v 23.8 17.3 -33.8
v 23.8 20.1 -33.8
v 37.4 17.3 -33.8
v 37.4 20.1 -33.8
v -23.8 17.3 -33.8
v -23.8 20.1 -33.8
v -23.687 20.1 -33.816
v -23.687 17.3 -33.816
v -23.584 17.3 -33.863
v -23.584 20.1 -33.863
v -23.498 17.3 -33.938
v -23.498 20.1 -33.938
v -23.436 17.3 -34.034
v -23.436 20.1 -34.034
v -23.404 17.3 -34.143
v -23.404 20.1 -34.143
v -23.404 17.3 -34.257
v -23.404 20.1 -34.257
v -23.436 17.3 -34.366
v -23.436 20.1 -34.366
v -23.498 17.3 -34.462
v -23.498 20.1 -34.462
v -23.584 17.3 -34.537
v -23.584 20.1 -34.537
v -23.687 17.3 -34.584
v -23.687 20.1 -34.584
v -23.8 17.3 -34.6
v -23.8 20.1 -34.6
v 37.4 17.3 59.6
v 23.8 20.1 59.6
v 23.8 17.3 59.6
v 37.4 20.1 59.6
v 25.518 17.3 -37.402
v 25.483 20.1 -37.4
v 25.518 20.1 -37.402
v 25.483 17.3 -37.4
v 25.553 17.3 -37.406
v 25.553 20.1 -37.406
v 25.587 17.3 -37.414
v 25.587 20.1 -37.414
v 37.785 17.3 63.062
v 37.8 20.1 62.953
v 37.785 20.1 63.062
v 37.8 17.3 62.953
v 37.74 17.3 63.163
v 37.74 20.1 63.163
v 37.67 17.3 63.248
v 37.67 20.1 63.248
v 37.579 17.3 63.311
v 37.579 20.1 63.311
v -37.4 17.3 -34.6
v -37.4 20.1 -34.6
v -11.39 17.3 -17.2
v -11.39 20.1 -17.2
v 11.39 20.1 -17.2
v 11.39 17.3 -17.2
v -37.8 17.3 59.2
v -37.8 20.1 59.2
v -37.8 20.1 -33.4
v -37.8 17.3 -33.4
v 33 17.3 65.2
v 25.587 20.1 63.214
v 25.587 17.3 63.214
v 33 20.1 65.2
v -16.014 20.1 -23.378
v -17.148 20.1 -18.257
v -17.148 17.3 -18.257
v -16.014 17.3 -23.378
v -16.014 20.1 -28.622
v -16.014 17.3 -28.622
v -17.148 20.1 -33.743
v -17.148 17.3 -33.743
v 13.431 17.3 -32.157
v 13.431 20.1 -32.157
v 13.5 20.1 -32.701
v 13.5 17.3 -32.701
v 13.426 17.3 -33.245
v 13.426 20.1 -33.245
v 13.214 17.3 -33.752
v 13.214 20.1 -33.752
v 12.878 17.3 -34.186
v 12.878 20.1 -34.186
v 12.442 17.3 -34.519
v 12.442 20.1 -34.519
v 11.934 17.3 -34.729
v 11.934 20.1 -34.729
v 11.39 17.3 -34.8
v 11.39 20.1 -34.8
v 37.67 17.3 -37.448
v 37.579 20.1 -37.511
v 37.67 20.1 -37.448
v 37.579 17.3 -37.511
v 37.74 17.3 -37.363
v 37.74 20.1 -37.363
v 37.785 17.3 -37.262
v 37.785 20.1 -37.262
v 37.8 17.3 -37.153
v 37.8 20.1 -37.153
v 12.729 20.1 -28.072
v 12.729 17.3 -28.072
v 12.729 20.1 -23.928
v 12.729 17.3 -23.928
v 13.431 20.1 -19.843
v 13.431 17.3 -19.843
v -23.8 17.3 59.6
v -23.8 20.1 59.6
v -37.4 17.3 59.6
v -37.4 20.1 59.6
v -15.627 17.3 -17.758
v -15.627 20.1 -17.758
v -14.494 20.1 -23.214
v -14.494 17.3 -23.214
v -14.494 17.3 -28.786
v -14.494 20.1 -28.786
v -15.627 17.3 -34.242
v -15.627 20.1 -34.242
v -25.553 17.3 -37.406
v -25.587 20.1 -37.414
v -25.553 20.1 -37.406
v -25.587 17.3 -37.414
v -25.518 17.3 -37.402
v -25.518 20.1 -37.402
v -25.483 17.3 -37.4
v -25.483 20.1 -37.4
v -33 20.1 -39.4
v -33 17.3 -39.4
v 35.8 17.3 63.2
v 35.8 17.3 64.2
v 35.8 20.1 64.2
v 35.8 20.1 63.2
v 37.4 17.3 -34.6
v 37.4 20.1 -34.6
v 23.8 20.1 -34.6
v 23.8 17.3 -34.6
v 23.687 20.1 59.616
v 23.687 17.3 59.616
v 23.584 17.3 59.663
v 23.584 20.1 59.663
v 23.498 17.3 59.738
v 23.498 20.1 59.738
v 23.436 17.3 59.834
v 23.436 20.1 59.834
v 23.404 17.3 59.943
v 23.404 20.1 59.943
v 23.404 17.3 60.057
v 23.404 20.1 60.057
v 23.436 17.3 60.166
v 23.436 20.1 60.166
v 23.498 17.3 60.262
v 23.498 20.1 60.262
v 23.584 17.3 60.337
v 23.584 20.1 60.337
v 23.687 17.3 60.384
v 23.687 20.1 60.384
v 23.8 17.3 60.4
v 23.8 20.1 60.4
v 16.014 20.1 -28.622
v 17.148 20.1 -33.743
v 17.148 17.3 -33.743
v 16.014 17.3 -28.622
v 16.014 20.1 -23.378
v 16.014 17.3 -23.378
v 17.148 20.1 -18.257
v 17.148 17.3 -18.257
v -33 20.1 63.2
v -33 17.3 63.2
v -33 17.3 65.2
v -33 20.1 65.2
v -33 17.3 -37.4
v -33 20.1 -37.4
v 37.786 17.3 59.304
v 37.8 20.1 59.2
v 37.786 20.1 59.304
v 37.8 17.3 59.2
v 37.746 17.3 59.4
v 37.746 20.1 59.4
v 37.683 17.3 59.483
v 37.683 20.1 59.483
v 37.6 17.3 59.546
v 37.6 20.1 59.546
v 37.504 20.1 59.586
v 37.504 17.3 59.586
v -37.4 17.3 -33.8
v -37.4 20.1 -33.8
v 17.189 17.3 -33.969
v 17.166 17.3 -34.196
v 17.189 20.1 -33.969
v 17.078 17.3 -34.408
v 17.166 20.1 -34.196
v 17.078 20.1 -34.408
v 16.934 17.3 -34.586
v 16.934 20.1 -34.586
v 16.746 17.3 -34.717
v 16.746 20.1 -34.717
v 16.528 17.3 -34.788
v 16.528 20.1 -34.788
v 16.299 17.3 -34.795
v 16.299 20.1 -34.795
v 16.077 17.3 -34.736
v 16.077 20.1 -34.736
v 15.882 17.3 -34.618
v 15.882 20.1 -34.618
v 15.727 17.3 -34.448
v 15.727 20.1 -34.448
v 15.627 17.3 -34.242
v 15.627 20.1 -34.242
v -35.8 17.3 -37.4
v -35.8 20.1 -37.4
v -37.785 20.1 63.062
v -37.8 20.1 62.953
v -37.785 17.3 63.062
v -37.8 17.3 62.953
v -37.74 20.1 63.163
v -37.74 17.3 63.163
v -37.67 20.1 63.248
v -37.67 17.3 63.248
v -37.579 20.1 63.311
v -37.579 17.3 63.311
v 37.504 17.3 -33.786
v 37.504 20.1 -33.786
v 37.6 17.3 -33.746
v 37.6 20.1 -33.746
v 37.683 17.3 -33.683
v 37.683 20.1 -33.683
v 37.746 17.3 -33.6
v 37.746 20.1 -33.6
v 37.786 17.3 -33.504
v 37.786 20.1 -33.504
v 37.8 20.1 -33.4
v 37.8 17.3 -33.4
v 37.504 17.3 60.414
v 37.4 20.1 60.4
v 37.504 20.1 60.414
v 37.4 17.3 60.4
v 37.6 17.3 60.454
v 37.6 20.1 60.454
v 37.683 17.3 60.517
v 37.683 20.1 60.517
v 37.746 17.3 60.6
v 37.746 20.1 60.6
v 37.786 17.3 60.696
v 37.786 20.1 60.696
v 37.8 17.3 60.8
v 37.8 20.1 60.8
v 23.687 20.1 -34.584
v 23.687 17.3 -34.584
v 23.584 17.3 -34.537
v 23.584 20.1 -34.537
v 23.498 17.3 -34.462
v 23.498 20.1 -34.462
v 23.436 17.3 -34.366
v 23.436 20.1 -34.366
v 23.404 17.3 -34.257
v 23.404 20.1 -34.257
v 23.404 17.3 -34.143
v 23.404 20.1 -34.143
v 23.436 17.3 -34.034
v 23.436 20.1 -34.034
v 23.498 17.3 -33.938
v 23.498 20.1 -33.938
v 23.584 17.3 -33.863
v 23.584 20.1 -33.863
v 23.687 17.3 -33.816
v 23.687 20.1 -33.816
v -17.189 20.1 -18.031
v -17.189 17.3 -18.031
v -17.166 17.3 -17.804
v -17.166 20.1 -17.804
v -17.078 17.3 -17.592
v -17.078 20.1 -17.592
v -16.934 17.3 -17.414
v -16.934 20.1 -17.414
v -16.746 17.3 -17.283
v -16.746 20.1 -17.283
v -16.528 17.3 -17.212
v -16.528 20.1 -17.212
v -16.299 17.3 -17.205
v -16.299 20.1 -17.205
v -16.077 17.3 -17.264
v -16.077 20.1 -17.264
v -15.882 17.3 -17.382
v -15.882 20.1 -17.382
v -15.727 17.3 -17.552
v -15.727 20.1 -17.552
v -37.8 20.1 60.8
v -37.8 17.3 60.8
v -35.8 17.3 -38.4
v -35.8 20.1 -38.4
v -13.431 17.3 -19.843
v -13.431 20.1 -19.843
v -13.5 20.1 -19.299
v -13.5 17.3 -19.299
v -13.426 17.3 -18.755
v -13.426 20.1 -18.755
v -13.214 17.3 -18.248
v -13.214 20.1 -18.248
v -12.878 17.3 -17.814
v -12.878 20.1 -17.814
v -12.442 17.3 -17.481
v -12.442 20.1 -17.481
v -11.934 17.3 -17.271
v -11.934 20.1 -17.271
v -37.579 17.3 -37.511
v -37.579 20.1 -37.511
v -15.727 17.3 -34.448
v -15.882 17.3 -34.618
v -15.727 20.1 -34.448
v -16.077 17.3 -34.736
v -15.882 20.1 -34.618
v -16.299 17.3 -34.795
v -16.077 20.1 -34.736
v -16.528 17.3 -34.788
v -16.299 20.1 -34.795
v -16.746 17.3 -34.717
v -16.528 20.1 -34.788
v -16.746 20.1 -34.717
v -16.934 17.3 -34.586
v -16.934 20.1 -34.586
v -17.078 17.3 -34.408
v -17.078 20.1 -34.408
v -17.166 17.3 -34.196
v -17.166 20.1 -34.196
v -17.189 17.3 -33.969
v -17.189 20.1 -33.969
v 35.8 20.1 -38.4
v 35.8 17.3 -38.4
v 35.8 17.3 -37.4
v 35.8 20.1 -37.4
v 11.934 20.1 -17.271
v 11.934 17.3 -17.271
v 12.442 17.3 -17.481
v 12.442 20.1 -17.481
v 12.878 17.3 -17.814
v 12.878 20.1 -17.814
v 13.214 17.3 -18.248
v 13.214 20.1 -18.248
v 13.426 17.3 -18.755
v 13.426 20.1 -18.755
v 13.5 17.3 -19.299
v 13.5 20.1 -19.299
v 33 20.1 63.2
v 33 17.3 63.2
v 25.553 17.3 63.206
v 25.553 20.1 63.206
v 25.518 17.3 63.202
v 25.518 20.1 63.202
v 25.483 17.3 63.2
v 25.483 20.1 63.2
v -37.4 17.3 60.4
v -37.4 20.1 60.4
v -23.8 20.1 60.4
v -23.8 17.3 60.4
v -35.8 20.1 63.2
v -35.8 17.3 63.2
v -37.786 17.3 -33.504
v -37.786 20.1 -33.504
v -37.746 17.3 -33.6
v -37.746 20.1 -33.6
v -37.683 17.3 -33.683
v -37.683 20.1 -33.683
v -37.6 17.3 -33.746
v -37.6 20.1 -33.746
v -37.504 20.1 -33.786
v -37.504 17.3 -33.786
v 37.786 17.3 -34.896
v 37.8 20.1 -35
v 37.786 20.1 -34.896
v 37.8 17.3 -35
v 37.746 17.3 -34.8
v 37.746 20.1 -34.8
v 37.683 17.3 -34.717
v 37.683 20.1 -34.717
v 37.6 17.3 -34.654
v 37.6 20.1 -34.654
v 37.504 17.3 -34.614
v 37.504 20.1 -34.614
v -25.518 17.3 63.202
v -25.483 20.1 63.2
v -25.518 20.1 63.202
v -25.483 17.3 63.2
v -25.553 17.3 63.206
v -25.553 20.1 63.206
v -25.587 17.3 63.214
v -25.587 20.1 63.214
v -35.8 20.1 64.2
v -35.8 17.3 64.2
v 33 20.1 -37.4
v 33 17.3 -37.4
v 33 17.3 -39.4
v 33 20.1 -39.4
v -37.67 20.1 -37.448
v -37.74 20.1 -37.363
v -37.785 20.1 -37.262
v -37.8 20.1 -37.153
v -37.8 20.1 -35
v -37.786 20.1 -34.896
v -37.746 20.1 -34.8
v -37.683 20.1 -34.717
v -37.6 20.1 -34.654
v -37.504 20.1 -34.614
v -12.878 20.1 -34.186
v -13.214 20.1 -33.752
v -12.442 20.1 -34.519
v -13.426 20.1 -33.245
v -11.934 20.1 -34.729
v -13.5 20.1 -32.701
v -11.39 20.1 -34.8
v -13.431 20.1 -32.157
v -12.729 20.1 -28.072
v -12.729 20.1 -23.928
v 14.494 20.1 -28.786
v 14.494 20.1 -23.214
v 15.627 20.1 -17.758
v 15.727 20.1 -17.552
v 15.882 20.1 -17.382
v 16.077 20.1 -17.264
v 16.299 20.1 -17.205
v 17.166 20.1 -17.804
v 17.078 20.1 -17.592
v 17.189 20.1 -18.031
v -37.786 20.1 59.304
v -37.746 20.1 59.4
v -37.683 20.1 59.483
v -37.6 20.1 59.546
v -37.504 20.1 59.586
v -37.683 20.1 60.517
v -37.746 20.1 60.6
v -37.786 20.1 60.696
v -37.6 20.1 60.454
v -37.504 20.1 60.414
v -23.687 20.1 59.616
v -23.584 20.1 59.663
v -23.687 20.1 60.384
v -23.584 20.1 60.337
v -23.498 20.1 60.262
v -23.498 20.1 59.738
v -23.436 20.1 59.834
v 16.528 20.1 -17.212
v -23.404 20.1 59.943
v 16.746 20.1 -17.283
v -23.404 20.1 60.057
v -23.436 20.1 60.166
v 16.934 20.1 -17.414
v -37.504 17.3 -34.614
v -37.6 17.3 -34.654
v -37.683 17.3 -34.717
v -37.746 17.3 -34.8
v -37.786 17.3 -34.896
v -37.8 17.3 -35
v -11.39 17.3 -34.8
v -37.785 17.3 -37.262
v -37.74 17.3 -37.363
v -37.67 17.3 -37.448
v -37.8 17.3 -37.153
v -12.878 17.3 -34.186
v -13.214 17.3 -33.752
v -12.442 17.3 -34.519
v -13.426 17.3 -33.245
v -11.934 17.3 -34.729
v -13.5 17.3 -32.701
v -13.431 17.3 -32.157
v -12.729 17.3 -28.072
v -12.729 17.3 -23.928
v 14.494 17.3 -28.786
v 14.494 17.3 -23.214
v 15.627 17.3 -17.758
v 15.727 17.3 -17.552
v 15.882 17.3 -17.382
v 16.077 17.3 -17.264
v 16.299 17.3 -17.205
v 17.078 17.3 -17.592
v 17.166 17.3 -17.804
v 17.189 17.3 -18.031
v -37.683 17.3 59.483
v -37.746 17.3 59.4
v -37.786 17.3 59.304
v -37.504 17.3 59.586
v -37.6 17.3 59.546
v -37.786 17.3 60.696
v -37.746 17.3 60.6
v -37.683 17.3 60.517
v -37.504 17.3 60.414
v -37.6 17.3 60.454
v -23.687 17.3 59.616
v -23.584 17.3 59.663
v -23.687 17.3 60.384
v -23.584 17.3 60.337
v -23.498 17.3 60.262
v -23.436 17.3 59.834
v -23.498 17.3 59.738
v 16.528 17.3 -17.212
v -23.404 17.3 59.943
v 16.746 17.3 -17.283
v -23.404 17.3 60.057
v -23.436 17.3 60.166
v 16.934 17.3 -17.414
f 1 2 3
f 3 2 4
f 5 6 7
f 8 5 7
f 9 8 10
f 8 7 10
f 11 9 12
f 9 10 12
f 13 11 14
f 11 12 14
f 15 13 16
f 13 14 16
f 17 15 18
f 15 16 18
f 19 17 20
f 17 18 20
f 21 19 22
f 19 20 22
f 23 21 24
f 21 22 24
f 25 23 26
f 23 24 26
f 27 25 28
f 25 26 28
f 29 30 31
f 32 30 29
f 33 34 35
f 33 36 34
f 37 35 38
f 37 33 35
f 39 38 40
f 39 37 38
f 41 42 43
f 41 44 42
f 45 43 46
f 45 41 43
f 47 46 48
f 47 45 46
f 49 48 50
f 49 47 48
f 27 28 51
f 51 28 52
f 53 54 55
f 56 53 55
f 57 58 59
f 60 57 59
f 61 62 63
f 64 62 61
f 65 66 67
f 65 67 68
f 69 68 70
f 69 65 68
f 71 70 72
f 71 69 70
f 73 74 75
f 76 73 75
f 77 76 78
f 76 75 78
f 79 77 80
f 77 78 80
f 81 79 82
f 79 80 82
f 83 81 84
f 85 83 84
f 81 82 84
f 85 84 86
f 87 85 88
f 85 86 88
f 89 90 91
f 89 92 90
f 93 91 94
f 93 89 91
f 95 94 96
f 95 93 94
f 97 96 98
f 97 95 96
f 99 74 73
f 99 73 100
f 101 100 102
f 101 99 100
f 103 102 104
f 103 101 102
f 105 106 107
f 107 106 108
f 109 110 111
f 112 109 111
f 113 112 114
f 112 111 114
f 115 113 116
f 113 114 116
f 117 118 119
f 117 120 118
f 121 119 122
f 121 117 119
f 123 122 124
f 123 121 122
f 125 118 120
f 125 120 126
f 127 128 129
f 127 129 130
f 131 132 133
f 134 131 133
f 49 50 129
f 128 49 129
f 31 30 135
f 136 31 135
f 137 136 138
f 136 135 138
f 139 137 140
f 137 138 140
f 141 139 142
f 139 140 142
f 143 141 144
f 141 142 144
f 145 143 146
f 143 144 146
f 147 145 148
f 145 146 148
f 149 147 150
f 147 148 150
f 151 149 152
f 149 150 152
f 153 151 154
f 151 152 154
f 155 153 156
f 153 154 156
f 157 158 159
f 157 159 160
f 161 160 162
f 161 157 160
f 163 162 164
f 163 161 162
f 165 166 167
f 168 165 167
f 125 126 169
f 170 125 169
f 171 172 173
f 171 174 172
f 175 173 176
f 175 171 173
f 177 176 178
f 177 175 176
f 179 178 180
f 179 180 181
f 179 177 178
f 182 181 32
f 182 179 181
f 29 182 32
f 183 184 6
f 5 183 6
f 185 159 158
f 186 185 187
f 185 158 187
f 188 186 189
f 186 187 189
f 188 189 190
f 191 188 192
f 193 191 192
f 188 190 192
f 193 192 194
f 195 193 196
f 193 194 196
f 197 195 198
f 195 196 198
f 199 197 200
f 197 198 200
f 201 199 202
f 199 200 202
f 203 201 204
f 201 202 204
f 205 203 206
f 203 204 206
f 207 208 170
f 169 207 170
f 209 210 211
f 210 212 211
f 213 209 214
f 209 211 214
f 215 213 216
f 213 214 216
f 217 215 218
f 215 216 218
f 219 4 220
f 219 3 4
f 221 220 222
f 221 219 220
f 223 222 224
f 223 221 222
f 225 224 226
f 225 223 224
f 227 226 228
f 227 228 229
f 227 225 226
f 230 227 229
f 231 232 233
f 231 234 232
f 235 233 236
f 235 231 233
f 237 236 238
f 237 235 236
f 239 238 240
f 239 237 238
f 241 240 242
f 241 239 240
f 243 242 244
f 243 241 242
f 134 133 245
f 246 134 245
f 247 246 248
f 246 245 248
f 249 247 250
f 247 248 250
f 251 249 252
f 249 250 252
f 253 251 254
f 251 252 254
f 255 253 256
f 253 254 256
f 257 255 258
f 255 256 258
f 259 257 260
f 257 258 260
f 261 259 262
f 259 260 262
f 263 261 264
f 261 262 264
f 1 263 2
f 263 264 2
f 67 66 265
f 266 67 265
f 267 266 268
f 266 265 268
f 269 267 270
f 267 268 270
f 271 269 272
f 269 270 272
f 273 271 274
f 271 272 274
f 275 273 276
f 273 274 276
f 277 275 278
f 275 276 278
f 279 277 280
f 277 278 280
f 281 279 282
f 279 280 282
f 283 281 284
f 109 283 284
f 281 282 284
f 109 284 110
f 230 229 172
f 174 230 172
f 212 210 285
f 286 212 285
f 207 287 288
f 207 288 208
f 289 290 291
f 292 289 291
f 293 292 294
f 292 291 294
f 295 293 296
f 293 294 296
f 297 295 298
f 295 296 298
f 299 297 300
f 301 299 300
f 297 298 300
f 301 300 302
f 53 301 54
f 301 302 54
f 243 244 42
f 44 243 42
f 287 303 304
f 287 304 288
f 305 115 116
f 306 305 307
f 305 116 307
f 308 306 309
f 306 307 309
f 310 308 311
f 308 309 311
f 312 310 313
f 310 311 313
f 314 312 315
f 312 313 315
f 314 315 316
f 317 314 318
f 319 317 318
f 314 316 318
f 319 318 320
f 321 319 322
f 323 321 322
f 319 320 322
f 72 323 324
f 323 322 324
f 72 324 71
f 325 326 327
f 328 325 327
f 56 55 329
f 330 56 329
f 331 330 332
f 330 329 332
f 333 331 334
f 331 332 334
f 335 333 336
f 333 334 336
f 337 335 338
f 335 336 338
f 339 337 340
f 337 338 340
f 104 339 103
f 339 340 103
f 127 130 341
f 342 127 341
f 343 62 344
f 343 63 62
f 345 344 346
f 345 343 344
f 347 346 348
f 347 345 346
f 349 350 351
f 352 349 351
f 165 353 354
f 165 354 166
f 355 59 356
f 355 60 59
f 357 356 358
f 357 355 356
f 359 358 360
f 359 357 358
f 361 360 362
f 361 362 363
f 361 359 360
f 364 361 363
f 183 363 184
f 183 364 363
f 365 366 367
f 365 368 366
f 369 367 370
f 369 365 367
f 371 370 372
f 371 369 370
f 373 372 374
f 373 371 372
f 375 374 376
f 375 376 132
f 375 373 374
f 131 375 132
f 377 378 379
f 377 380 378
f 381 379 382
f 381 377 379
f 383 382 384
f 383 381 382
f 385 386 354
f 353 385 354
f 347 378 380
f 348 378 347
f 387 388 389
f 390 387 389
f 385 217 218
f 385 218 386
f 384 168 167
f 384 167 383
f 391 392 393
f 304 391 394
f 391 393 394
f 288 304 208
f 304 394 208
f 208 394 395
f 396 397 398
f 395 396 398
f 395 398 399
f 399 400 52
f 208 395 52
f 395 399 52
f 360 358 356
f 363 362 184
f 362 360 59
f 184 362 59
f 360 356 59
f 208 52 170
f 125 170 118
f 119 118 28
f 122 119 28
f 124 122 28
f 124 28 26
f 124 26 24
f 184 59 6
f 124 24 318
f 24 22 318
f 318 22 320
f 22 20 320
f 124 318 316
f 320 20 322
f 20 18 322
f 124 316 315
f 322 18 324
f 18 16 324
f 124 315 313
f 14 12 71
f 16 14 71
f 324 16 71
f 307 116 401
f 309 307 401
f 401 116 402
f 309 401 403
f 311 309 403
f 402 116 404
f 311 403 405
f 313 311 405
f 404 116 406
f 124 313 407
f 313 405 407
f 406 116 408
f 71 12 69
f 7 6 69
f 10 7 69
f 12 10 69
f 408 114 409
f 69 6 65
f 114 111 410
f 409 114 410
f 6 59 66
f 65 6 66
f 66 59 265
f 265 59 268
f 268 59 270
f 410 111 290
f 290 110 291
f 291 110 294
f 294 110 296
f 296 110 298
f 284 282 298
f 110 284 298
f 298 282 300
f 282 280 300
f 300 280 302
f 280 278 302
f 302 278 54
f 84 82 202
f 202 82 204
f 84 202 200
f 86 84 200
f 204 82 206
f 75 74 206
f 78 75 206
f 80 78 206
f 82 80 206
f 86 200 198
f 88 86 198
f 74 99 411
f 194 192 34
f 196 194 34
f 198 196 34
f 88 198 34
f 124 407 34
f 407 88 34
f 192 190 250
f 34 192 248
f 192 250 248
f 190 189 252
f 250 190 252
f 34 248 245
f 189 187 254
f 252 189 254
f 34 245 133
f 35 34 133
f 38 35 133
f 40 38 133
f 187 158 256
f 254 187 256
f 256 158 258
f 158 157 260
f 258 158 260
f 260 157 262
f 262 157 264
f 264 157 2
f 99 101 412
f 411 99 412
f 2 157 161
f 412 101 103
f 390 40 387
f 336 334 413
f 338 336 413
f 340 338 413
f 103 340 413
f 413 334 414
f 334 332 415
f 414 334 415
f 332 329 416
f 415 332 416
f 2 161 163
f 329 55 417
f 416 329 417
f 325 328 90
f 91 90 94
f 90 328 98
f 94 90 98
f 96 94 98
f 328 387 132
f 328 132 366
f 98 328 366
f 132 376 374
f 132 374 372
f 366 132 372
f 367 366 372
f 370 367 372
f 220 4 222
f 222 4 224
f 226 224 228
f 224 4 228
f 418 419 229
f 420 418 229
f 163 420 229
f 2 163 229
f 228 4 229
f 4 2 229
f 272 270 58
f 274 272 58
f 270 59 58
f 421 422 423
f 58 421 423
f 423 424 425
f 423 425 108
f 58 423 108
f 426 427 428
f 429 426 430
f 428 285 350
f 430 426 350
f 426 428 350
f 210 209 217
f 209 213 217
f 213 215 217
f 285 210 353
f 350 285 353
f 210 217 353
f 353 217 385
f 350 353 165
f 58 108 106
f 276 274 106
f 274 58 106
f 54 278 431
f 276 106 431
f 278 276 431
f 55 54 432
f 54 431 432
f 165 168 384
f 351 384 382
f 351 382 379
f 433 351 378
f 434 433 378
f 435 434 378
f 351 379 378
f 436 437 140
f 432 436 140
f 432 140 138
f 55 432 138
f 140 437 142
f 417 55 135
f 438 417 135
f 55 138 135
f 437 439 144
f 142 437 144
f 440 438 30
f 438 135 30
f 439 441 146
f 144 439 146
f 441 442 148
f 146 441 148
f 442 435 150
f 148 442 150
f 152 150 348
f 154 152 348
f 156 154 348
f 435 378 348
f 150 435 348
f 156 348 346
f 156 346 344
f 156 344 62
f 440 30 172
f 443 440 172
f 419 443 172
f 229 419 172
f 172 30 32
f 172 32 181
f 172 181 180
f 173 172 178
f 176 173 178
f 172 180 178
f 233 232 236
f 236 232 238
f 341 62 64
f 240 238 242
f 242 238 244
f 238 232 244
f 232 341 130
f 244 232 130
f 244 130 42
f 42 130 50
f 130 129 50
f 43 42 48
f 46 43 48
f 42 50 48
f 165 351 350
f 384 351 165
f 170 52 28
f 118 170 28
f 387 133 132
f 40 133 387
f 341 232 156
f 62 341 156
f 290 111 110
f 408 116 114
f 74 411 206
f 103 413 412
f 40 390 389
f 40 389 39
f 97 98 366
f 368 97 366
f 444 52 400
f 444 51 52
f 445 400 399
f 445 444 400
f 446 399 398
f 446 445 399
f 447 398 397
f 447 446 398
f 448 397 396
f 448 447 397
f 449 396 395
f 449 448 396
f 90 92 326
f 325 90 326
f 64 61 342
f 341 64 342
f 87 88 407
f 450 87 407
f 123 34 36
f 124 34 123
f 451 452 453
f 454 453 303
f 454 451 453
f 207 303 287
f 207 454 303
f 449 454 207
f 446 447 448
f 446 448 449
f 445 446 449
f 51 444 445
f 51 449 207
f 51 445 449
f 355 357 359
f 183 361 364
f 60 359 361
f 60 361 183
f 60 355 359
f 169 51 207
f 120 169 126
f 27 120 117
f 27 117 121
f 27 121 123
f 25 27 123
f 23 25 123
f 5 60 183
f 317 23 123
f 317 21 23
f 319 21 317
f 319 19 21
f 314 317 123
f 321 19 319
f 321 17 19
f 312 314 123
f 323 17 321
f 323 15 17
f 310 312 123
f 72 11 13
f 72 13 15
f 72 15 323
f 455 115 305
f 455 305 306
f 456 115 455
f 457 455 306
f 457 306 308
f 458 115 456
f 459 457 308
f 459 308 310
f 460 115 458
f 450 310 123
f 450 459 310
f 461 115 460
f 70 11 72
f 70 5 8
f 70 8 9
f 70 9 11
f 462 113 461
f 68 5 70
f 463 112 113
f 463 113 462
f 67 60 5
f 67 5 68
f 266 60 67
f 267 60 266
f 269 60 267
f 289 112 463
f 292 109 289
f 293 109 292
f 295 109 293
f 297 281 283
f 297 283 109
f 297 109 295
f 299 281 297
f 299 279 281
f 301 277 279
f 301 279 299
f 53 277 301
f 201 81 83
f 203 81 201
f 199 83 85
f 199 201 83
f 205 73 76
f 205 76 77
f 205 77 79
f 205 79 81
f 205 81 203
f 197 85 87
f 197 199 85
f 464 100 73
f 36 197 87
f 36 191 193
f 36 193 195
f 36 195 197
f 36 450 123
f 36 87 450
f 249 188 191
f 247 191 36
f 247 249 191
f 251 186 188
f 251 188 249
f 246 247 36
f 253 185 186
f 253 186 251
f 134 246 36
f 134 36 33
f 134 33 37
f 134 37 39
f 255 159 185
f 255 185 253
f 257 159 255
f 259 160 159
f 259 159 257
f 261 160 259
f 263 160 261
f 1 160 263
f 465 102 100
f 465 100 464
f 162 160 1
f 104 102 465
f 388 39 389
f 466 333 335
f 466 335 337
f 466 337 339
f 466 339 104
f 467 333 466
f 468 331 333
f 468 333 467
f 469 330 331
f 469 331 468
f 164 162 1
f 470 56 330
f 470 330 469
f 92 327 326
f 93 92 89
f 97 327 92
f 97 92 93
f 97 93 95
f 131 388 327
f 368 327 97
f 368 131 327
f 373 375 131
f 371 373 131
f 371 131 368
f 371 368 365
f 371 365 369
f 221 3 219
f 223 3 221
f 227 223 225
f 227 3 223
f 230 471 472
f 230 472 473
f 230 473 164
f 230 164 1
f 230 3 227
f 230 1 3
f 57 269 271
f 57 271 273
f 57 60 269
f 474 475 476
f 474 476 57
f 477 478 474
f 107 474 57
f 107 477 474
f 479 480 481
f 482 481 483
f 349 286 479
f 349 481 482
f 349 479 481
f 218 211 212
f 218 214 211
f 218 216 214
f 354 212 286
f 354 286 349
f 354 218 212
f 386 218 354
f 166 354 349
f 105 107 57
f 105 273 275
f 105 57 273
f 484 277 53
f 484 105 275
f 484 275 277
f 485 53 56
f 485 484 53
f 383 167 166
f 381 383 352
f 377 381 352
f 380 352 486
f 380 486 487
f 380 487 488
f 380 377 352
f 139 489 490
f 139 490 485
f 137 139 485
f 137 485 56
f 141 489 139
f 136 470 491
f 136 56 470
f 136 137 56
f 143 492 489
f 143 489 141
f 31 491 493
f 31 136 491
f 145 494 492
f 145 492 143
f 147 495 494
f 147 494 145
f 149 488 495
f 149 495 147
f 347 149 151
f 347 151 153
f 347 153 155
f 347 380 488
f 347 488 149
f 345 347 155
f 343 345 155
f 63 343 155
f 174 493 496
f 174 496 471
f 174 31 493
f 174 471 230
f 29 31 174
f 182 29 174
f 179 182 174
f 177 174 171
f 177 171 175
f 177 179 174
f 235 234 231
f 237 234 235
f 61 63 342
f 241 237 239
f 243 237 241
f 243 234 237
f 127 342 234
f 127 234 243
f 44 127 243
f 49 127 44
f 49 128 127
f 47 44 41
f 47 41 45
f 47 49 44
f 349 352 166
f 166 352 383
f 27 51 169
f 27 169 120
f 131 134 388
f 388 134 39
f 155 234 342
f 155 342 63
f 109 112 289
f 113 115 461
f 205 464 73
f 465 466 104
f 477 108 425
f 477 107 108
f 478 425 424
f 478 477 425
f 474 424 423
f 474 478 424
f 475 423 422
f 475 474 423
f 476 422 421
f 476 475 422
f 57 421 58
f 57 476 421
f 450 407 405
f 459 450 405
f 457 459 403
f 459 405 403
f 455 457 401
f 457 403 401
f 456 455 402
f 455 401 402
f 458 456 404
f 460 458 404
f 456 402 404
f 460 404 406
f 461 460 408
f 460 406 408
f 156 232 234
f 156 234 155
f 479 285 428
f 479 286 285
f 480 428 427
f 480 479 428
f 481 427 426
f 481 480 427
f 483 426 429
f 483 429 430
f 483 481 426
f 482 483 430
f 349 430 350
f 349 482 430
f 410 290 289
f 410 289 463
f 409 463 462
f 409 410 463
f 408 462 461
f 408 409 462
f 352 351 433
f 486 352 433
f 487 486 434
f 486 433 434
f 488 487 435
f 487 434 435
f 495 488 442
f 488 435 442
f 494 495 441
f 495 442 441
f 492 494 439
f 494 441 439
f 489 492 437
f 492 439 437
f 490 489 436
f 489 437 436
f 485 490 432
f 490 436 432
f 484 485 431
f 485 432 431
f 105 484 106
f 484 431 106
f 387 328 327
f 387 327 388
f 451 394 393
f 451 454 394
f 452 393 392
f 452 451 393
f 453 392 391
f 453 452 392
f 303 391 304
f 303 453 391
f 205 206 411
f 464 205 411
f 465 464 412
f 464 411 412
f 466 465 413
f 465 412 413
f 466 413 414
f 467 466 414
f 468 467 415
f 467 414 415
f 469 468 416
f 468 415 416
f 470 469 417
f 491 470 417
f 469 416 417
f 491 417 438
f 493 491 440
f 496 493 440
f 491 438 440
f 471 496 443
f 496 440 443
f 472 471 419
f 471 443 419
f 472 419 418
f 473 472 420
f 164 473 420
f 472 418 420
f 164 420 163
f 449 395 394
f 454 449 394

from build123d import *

# Parameters (mm, degrees)
PAD008_DEPTH = 2.8
FILLET001_R  = 0.4
POCKET_DEPTH = 2.801


with BuildPart() as part:
    # Sketch008 → Pad008 (new body)
    with BuildSketch(Plane(origin=(0, 20.1, 0), x_dir=(-1, 0, 0), z_dir=(0, 1, 0))):
        with BuildLine():
            Line((37.8, 63.2), (37.8, 60.4))
            Line((37.8, 60.4), (23.8, 60.4))
            ThreePointArc((23.8, 60.4), (23.4, 60), (23.8, 59.6))
            Line((23.8, 59.6), (37.8, 59.6))
            Line((37.8, 59.6), (37.8, -33.8))
            Line((37.8, -33.8), (23.8, -33.8))
            ThreePointArc((23.8, -33.8), (23.4, -34.2), (23.8, -34.6))
            Line((23.8, -34.6), (37.8, -34.6))
            Line((37.8, -34.6), (37.8, -37.4))
            Line((37.8, -37.4), (35.8, -38.4))
            Line((35.8, -38.4), (35.8, -37.4))
            Line((35.8, -37.4), (33, -37.4))
            Line((33, -39.4), (33, -37.4))
            Line((25.535898, -37.4), (33, -39.4))
            Line((-25.535898, -37.4), (25.535898, -37.4))
            Line((-33, -39.4), (-25.535898, -37.4))
            Line((-33, -37.4), (-33, -39.4))
            Line((-35.8, -37.4), (-33, -37.4))
            Line((-35.8, -38.4), (-35.8, -37.4))
            Line((-37.8, -37.4), (-35.8, -38.4))
            Line((-37.8, -37.4), (-37.8, -34.6))
            Line((-37.8, -34.6), (-23.8, -34.6))
            ThreePointArc((-23.8, -34.6), (-23.4, -34.2), (-23.8, -33.8))
            Line((-23.8, -33.8), (-37.8, -33.8))
            Line((-37.8, -33.8), (-37.8, 59.6))
            Line((-23.8, 59.6), (-37.8, 59.6))
            ThreePointArc((-23.8, 59.6), (-23.4, 60), (-23.8, 60.4))
            Line((-37.8, 60.4), (-23.8, 60.4))
            Line((-37.8, 60.4), (-37.8, 63.2))
            Line((-37.8, 63.2), (-35.8, 64.2))
            Line((-35.8, 64.2), (-35.8, 63.2))
            Line((-35.8, 63.2), (-33, 63.2))
            Line((-33, 65.2), (-33, 63.2))
            Line((-25.535898, 63.2), (-33, 65.2))
            Line((25.535898, 63.2), (-25.535898, 63.2))
            Line((33, 65.2), (25.535898, 63.2))
            Line((33, 63.2), (33, 65.2))
            Line((35.8, 63.2), (33, 63.2))
            Line((35.8, 64.2), (35.8, 63.2))
            Line((37.8, 63.2), (35.8, 64.2))
        make_face()
    extrude(amount=-PAD008_DEPTH)

    # Fillet001
    fillet001_edges = [part.edges().sort_by_distance(p)[0] for p in [
        (-37.8, 18.7, 59.6),
        (-37.8, 18.7, 60.4),
        (-37.8, 18.7, 63.2),
        (-25.535898, 18.7, 63.2),
        (25.535898, 18.7, 63.2),
        (37.8, 18.7, 63.2),
        (37.8, 18.7, 60.4),
        (37.8, 18.7, 59.6),
        (37.8, 18.7, -33.8),
        (37.8, 18.7, -34.6),
        (37.8, 18.7, -37.4),
        (25.535898, 18.7, -37.4),
        (-25.535898, 18.7, -37.4),
        (-37.8, 18.7, -37.4),
        (-37.8, 18.7, -33.8),
        (-37.8, 18.7, -34.6),
    ]]
    fillet(fillet001_edges, radius=FILLET001_R)

    # Sketch029 → Pocket (cut, through all)
    with BuildSketch(Plane(origin=(0, 20.1, 0), x_dir=(-1, 0, 0), z_dir=(0, 1, 0))):
        with BuildLine():
            Line((-11.39, -34.8), (11.39, -34.8))
            ThreePointArc((11.39, -34.8), (13.059932, -33.979739), (13.431495, -32.156708))
            ThreePointArc((13.431495, -19.843292), (12.640618, -26), (13.431495, -32.156708))
            ThreePointArc((13.431495, -19.843292), (13.059932, -18.020261), (11.39, -17.2))
            Line((11.39, -17.2), (-11.39, -17.2))
            ThreePointArc((-11.39, -17.2), (-13.059932, -18.020261), (-13.431495, -19.843292))
            ThreePointArc((-13.431495, -32.156708), (-12.640618, -26), (-13.431495, -19.843292))
            ThreePointArc((-13.431495, -32.156708), (-13.059932, -33.979739), (-11.39, -34.8))
        make_face()
        with BuildLine():
            ThreePointArc((-15.627473, -17.758024), (-16.639367, -17.239858), (-17.147686, -18.256734))
            ThreePointArc((-17.147686, -33.743266), (-15.87146, -26), (-17.147686, -18.256734))
            ThreePointArc((-17.147686, -33.743266), (-16.639367, -34.760142), (-15.627473, -34.241976))
            ThreePointArc((-15.627473, -34.241976), (-14.351104, -26), (-15.627473, -17.758024))
        make_face()
        with BuildLine():
            ThreePointArc((17.147686, -18.256734), (16.639367, -17.239858), (15.627473, -17.758024))
            ThreePointArc((15.627473, -17.758024), (14.351104, -26), (15.627473, -34.241976))
            ThreePointArc((15.627473, -34.241976), (16.639367, -34.760142), (17.147686, -33.743266))
            ThreePointArc((17.147686, -18.256734), (15.87146, -26), (17.147686, -33.743266))
        make_face()
    extrude(amount=-POCKET_DEPTH, mode=Mode.SUBTRACT)


solid = part.part
